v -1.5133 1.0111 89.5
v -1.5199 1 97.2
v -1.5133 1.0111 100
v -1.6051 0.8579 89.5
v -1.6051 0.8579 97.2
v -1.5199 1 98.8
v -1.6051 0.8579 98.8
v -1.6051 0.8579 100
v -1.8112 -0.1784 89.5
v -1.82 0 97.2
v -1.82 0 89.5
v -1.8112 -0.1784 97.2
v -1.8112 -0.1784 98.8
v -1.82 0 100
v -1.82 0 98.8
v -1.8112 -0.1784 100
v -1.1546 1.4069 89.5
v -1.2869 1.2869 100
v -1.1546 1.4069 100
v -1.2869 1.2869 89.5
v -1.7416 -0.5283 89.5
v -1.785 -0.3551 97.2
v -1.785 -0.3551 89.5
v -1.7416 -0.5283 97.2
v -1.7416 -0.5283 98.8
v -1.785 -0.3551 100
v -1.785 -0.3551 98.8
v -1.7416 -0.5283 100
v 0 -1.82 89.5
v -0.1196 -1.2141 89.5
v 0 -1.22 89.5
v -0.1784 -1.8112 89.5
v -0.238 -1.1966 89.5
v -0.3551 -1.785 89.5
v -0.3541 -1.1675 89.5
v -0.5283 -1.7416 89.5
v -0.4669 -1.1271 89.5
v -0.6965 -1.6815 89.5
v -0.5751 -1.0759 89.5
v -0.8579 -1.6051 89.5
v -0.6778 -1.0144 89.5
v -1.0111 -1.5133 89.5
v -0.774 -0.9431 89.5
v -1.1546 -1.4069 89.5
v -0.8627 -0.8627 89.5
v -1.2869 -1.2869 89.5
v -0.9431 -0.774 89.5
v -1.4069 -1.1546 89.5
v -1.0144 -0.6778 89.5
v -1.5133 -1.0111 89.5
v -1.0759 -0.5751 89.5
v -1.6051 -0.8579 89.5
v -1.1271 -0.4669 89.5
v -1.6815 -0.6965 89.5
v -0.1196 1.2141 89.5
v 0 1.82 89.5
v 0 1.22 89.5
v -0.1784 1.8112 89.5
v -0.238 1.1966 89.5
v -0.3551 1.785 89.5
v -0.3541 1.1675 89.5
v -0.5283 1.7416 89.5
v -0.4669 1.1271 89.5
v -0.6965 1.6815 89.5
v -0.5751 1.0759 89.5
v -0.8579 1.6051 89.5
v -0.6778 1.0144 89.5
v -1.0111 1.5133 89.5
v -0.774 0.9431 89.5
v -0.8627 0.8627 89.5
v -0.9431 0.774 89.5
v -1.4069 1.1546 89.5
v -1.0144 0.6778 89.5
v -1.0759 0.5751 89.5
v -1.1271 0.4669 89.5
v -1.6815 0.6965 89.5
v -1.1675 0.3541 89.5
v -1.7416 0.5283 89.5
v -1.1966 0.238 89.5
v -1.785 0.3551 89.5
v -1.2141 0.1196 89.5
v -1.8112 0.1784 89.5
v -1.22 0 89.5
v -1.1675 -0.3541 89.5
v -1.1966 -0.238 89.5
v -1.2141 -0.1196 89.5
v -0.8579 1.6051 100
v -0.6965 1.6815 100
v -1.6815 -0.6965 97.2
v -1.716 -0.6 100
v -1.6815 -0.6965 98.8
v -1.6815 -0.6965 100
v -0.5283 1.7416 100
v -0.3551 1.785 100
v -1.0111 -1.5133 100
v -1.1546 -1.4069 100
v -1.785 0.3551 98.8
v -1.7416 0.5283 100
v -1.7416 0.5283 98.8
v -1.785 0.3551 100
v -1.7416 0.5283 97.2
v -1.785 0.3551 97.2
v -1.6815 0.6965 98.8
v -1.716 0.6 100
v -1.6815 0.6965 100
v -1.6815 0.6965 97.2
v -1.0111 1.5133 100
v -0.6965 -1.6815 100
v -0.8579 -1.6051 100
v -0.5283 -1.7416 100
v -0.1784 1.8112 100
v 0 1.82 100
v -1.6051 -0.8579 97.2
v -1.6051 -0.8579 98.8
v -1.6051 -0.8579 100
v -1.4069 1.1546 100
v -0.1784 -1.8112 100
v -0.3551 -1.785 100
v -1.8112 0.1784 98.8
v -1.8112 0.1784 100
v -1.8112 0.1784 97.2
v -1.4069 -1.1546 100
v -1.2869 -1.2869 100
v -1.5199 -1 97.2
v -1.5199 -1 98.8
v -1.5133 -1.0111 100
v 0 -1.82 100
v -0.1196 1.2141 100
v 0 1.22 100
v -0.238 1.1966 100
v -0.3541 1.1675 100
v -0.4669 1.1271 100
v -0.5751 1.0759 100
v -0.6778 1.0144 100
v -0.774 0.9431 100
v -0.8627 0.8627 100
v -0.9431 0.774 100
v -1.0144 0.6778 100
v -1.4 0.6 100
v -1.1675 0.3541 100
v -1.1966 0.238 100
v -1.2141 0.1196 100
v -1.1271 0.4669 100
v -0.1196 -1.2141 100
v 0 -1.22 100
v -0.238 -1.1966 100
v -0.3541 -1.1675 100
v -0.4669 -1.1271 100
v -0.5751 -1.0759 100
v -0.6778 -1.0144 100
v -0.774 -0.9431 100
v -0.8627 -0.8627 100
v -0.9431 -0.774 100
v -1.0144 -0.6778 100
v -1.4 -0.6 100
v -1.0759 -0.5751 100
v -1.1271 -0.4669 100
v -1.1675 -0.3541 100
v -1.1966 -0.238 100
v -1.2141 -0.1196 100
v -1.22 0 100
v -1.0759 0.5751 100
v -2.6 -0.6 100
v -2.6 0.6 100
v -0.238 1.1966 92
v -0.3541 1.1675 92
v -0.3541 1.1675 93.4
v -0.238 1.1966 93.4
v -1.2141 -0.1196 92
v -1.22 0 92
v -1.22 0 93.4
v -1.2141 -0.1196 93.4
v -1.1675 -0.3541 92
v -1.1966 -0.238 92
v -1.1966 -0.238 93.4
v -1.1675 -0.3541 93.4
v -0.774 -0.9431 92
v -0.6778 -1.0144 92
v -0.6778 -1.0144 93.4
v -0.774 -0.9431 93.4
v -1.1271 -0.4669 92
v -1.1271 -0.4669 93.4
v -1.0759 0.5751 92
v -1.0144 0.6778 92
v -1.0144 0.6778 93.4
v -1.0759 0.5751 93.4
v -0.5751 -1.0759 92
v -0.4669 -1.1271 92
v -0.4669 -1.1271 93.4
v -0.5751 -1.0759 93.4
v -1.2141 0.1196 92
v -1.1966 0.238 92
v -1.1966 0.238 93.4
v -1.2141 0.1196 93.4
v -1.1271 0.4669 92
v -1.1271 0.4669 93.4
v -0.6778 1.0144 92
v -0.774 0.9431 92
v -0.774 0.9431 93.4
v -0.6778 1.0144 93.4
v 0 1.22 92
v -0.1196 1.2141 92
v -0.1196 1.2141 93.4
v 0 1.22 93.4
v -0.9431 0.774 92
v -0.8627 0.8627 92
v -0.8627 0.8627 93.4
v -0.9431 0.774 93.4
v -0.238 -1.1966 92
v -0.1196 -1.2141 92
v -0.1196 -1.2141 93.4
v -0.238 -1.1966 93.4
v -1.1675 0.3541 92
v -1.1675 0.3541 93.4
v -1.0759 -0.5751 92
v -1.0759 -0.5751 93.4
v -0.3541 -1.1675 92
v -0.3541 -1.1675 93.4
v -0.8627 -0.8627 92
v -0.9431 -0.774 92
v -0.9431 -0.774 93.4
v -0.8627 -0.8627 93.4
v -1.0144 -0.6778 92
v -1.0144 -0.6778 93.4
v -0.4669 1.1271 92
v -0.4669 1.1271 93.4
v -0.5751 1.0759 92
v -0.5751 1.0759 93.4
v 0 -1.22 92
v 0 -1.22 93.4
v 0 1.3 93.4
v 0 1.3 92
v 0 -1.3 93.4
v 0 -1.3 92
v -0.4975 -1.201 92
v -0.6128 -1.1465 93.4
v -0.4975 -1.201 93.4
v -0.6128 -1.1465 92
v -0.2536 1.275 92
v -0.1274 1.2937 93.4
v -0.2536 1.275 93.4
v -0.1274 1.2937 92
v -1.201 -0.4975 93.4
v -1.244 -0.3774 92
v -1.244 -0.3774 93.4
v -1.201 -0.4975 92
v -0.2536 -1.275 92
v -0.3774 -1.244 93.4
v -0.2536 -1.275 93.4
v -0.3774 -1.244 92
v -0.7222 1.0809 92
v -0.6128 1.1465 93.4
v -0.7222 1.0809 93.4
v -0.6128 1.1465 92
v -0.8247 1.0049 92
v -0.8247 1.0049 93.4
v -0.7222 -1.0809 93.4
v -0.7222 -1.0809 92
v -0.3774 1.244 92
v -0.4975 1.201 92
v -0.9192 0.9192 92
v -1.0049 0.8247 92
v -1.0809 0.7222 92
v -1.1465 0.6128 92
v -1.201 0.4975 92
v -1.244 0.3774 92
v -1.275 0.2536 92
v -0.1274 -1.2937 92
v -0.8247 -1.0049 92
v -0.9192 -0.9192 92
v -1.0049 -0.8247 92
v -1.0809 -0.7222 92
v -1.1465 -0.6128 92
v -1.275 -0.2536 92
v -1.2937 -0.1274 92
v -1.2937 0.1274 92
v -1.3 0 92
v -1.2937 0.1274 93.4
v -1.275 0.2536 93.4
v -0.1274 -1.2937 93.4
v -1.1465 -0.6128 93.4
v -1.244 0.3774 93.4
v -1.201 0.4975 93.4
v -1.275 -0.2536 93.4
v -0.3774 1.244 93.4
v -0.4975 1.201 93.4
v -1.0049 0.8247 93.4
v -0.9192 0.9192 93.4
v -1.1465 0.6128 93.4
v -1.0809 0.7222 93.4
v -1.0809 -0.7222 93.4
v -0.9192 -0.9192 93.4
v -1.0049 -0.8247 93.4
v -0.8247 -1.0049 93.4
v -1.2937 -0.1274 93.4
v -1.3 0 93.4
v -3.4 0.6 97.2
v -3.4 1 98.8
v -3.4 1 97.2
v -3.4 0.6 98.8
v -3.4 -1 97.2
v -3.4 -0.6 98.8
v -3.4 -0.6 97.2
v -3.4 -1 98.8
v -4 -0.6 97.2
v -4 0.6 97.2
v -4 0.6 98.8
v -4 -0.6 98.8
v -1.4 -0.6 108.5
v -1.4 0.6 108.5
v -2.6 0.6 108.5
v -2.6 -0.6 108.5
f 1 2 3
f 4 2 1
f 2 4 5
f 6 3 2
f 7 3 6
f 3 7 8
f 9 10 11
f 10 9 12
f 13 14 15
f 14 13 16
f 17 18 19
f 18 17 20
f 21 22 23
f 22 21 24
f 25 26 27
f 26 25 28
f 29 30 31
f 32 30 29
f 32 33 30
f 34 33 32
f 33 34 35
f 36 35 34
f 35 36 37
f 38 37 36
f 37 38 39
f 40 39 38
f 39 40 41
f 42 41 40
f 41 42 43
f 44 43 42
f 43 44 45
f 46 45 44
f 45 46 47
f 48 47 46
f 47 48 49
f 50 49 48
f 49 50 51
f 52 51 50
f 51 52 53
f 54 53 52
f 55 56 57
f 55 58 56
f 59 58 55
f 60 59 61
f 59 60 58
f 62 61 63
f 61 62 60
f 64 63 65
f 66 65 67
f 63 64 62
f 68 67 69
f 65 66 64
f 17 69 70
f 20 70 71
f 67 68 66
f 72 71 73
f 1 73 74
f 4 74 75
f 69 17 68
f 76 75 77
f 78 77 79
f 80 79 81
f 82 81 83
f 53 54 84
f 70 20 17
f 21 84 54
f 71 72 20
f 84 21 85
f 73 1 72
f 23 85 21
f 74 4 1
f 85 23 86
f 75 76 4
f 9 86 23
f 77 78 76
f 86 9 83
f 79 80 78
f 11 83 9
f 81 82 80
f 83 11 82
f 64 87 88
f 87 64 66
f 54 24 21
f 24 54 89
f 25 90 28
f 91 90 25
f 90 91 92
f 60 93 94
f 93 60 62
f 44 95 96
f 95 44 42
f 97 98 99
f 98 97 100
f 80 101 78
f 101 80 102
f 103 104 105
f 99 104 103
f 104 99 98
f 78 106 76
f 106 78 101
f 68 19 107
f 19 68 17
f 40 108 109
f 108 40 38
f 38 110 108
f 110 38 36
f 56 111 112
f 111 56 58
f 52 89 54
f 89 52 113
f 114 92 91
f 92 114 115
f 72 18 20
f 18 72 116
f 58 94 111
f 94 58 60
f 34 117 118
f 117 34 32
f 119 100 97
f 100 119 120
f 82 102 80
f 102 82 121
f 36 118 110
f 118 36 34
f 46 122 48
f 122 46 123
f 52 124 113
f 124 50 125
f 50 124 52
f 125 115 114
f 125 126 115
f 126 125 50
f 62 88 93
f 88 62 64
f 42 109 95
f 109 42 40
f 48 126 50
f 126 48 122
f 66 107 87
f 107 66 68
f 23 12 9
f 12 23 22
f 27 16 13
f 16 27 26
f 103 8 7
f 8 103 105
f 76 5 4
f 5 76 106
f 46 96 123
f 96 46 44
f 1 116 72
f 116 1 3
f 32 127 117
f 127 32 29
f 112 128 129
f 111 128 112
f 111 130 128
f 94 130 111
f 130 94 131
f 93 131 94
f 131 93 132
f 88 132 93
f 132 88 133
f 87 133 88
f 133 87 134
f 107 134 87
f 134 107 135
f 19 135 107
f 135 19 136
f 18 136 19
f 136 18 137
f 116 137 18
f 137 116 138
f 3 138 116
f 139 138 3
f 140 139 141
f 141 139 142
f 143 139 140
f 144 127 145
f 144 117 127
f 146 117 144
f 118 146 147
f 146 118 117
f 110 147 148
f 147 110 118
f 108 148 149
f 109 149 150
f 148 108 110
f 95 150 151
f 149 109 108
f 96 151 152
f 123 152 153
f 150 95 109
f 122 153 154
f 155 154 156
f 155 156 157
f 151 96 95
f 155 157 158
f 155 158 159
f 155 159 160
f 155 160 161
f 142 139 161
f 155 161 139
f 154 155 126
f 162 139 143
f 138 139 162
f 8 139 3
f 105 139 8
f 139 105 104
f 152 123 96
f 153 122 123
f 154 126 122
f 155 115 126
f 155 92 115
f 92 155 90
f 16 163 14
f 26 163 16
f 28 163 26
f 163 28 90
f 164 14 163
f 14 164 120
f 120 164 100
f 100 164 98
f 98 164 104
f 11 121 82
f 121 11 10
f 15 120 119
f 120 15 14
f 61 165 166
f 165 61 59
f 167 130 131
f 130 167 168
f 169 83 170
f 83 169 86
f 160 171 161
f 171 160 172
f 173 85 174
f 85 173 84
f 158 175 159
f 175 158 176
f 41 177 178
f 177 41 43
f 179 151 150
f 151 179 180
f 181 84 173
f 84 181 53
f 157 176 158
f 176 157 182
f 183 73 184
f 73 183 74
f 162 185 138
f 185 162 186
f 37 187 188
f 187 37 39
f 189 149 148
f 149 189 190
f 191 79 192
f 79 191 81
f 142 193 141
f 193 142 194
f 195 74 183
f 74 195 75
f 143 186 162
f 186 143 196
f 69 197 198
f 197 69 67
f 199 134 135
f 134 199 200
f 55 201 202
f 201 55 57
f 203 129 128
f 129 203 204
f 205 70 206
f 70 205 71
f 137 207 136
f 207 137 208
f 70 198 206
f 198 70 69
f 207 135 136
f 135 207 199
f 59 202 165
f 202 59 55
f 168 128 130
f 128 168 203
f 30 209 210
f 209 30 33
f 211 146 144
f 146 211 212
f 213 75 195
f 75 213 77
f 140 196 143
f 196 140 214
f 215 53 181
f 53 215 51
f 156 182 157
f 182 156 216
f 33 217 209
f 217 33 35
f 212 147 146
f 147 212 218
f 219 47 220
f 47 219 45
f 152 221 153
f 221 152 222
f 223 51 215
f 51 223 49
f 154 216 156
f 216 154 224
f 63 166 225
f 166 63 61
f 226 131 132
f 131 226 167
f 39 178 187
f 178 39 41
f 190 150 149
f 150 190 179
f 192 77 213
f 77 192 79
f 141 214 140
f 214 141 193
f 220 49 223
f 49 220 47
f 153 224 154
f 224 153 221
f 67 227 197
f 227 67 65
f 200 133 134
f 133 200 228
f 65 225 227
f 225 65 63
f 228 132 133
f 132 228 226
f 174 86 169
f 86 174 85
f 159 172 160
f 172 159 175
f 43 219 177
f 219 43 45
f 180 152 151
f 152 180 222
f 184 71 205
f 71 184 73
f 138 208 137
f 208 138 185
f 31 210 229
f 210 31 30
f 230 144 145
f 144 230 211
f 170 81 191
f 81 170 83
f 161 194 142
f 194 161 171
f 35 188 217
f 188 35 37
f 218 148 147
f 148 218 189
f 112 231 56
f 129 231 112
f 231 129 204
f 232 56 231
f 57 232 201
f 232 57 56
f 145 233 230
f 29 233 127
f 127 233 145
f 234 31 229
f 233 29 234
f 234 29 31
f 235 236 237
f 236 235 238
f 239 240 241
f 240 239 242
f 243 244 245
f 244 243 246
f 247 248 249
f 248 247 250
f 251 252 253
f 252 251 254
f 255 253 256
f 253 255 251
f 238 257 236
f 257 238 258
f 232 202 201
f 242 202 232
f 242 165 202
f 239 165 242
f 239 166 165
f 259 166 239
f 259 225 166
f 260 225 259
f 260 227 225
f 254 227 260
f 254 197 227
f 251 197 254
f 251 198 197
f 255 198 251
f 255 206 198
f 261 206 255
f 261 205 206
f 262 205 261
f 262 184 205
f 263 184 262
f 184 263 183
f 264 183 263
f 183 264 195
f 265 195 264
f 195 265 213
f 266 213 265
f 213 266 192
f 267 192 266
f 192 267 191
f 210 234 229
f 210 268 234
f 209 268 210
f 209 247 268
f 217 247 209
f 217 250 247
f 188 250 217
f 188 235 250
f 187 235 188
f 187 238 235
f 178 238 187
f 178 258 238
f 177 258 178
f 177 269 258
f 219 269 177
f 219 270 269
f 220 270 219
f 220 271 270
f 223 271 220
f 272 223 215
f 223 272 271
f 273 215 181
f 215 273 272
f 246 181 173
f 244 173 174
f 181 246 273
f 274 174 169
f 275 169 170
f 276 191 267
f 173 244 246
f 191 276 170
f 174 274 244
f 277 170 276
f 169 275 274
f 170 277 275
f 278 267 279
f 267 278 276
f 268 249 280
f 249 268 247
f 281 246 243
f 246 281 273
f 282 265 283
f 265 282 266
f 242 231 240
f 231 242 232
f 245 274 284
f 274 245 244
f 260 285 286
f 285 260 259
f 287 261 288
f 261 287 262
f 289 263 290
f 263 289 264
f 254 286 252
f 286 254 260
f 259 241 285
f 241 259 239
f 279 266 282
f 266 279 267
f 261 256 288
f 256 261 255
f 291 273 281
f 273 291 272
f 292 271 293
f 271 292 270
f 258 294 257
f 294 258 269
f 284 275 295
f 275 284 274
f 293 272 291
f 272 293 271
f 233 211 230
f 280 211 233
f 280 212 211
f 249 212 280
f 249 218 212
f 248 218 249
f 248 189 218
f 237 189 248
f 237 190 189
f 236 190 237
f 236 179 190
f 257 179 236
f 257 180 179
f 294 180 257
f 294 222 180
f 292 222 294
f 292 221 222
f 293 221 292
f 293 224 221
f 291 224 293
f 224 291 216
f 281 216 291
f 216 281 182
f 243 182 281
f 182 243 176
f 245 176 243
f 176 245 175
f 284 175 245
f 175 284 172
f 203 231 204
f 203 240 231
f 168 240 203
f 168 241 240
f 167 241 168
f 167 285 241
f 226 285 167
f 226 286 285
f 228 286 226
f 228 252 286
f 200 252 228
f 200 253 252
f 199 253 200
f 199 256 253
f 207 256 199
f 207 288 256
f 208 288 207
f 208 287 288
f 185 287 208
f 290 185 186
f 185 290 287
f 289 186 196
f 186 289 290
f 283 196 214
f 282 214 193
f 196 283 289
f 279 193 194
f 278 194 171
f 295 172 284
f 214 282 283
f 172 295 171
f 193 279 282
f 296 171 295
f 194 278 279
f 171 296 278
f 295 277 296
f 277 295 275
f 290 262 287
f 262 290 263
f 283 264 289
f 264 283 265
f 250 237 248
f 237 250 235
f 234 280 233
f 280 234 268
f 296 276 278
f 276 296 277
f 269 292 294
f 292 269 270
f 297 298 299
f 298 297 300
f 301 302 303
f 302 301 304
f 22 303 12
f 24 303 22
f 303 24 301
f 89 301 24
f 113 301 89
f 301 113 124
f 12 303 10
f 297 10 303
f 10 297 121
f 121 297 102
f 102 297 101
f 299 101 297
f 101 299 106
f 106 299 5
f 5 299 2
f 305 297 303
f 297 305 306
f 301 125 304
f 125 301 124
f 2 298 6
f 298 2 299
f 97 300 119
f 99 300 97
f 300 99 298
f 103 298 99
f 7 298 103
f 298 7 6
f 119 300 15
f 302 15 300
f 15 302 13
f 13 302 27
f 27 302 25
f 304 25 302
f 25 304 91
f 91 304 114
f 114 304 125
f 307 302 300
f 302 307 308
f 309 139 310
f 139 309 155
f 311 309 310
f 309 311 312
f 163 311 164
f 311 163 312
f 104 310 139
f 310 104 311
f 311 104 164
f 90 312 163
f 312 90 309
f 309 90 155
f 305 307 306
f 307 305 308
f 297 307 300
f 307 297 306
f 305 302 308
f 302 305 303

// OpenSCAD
$fn = 64;
// Red carrier v2.1: sleeve 89.5..100, rib 92..93.4, inner track post + pusher.
PAD_R      = -2.0;
PUSH_R     = -3.4;
POST_TOP   = 108.5;
ARM_TOP    = 100.0;
SLEEVE_TOP = 100.0;
SLEEVE_BOT = 89.5;
SHELL_ID   = 1.22;
SHELL_OD   = 1.82;

module half_shell() {
    difference() {
        intersection() {
            difference() {
                translate([0,0,SLEEVE_BOT])
                    cylinder(h=SLEEVE_TOP-SLEEVE_BOT, r=SHELL_OD, center=false);
                translate([0,0,SLEEVE_BOT-0.1])
                    cylinder(h=SLEEVE_TOP-SLEEVE_BOT+0.2, r=SHELL_ID, center=false);
            }
            translate([-2,-2,SLEEVE_BOT-0.2])
                cube([2,4,SLEEVE_TOP-SLEEVE_BOT+0.4], center=false);
        }
        intersection() {
            difference() {
                translate([0,0,92.0]) cylinder(h=1.4, r=1.30, center=false);
                translate([0,0,91.9]) cylinder(h=1.6, r=1.00, center=false);
            }
            translate([-2,-2,91.8]) cube([2,4,1.8], center=false);
        }
    }
}

module arm() {
    hull() {
        translate([-1.70, -1.0, 97.2]) cube([0.2, 2.0, 1.6], center=false);
        translate([-3.40, -1.0, 97.2]) cube([0.2, 2.0, 1.6], center=false);
    }
    translate([PAD_R-0.6, -0.6, ARM_TOP])
        cube([1.2, 1.2, POST_TOP-ARM_TOP], center=false);
    translate([PUSH_R-0.6, -0.6, 97.2])
        cube([1.2, 1.2, 1.6], center=false);
}

half_shell();
arm();
